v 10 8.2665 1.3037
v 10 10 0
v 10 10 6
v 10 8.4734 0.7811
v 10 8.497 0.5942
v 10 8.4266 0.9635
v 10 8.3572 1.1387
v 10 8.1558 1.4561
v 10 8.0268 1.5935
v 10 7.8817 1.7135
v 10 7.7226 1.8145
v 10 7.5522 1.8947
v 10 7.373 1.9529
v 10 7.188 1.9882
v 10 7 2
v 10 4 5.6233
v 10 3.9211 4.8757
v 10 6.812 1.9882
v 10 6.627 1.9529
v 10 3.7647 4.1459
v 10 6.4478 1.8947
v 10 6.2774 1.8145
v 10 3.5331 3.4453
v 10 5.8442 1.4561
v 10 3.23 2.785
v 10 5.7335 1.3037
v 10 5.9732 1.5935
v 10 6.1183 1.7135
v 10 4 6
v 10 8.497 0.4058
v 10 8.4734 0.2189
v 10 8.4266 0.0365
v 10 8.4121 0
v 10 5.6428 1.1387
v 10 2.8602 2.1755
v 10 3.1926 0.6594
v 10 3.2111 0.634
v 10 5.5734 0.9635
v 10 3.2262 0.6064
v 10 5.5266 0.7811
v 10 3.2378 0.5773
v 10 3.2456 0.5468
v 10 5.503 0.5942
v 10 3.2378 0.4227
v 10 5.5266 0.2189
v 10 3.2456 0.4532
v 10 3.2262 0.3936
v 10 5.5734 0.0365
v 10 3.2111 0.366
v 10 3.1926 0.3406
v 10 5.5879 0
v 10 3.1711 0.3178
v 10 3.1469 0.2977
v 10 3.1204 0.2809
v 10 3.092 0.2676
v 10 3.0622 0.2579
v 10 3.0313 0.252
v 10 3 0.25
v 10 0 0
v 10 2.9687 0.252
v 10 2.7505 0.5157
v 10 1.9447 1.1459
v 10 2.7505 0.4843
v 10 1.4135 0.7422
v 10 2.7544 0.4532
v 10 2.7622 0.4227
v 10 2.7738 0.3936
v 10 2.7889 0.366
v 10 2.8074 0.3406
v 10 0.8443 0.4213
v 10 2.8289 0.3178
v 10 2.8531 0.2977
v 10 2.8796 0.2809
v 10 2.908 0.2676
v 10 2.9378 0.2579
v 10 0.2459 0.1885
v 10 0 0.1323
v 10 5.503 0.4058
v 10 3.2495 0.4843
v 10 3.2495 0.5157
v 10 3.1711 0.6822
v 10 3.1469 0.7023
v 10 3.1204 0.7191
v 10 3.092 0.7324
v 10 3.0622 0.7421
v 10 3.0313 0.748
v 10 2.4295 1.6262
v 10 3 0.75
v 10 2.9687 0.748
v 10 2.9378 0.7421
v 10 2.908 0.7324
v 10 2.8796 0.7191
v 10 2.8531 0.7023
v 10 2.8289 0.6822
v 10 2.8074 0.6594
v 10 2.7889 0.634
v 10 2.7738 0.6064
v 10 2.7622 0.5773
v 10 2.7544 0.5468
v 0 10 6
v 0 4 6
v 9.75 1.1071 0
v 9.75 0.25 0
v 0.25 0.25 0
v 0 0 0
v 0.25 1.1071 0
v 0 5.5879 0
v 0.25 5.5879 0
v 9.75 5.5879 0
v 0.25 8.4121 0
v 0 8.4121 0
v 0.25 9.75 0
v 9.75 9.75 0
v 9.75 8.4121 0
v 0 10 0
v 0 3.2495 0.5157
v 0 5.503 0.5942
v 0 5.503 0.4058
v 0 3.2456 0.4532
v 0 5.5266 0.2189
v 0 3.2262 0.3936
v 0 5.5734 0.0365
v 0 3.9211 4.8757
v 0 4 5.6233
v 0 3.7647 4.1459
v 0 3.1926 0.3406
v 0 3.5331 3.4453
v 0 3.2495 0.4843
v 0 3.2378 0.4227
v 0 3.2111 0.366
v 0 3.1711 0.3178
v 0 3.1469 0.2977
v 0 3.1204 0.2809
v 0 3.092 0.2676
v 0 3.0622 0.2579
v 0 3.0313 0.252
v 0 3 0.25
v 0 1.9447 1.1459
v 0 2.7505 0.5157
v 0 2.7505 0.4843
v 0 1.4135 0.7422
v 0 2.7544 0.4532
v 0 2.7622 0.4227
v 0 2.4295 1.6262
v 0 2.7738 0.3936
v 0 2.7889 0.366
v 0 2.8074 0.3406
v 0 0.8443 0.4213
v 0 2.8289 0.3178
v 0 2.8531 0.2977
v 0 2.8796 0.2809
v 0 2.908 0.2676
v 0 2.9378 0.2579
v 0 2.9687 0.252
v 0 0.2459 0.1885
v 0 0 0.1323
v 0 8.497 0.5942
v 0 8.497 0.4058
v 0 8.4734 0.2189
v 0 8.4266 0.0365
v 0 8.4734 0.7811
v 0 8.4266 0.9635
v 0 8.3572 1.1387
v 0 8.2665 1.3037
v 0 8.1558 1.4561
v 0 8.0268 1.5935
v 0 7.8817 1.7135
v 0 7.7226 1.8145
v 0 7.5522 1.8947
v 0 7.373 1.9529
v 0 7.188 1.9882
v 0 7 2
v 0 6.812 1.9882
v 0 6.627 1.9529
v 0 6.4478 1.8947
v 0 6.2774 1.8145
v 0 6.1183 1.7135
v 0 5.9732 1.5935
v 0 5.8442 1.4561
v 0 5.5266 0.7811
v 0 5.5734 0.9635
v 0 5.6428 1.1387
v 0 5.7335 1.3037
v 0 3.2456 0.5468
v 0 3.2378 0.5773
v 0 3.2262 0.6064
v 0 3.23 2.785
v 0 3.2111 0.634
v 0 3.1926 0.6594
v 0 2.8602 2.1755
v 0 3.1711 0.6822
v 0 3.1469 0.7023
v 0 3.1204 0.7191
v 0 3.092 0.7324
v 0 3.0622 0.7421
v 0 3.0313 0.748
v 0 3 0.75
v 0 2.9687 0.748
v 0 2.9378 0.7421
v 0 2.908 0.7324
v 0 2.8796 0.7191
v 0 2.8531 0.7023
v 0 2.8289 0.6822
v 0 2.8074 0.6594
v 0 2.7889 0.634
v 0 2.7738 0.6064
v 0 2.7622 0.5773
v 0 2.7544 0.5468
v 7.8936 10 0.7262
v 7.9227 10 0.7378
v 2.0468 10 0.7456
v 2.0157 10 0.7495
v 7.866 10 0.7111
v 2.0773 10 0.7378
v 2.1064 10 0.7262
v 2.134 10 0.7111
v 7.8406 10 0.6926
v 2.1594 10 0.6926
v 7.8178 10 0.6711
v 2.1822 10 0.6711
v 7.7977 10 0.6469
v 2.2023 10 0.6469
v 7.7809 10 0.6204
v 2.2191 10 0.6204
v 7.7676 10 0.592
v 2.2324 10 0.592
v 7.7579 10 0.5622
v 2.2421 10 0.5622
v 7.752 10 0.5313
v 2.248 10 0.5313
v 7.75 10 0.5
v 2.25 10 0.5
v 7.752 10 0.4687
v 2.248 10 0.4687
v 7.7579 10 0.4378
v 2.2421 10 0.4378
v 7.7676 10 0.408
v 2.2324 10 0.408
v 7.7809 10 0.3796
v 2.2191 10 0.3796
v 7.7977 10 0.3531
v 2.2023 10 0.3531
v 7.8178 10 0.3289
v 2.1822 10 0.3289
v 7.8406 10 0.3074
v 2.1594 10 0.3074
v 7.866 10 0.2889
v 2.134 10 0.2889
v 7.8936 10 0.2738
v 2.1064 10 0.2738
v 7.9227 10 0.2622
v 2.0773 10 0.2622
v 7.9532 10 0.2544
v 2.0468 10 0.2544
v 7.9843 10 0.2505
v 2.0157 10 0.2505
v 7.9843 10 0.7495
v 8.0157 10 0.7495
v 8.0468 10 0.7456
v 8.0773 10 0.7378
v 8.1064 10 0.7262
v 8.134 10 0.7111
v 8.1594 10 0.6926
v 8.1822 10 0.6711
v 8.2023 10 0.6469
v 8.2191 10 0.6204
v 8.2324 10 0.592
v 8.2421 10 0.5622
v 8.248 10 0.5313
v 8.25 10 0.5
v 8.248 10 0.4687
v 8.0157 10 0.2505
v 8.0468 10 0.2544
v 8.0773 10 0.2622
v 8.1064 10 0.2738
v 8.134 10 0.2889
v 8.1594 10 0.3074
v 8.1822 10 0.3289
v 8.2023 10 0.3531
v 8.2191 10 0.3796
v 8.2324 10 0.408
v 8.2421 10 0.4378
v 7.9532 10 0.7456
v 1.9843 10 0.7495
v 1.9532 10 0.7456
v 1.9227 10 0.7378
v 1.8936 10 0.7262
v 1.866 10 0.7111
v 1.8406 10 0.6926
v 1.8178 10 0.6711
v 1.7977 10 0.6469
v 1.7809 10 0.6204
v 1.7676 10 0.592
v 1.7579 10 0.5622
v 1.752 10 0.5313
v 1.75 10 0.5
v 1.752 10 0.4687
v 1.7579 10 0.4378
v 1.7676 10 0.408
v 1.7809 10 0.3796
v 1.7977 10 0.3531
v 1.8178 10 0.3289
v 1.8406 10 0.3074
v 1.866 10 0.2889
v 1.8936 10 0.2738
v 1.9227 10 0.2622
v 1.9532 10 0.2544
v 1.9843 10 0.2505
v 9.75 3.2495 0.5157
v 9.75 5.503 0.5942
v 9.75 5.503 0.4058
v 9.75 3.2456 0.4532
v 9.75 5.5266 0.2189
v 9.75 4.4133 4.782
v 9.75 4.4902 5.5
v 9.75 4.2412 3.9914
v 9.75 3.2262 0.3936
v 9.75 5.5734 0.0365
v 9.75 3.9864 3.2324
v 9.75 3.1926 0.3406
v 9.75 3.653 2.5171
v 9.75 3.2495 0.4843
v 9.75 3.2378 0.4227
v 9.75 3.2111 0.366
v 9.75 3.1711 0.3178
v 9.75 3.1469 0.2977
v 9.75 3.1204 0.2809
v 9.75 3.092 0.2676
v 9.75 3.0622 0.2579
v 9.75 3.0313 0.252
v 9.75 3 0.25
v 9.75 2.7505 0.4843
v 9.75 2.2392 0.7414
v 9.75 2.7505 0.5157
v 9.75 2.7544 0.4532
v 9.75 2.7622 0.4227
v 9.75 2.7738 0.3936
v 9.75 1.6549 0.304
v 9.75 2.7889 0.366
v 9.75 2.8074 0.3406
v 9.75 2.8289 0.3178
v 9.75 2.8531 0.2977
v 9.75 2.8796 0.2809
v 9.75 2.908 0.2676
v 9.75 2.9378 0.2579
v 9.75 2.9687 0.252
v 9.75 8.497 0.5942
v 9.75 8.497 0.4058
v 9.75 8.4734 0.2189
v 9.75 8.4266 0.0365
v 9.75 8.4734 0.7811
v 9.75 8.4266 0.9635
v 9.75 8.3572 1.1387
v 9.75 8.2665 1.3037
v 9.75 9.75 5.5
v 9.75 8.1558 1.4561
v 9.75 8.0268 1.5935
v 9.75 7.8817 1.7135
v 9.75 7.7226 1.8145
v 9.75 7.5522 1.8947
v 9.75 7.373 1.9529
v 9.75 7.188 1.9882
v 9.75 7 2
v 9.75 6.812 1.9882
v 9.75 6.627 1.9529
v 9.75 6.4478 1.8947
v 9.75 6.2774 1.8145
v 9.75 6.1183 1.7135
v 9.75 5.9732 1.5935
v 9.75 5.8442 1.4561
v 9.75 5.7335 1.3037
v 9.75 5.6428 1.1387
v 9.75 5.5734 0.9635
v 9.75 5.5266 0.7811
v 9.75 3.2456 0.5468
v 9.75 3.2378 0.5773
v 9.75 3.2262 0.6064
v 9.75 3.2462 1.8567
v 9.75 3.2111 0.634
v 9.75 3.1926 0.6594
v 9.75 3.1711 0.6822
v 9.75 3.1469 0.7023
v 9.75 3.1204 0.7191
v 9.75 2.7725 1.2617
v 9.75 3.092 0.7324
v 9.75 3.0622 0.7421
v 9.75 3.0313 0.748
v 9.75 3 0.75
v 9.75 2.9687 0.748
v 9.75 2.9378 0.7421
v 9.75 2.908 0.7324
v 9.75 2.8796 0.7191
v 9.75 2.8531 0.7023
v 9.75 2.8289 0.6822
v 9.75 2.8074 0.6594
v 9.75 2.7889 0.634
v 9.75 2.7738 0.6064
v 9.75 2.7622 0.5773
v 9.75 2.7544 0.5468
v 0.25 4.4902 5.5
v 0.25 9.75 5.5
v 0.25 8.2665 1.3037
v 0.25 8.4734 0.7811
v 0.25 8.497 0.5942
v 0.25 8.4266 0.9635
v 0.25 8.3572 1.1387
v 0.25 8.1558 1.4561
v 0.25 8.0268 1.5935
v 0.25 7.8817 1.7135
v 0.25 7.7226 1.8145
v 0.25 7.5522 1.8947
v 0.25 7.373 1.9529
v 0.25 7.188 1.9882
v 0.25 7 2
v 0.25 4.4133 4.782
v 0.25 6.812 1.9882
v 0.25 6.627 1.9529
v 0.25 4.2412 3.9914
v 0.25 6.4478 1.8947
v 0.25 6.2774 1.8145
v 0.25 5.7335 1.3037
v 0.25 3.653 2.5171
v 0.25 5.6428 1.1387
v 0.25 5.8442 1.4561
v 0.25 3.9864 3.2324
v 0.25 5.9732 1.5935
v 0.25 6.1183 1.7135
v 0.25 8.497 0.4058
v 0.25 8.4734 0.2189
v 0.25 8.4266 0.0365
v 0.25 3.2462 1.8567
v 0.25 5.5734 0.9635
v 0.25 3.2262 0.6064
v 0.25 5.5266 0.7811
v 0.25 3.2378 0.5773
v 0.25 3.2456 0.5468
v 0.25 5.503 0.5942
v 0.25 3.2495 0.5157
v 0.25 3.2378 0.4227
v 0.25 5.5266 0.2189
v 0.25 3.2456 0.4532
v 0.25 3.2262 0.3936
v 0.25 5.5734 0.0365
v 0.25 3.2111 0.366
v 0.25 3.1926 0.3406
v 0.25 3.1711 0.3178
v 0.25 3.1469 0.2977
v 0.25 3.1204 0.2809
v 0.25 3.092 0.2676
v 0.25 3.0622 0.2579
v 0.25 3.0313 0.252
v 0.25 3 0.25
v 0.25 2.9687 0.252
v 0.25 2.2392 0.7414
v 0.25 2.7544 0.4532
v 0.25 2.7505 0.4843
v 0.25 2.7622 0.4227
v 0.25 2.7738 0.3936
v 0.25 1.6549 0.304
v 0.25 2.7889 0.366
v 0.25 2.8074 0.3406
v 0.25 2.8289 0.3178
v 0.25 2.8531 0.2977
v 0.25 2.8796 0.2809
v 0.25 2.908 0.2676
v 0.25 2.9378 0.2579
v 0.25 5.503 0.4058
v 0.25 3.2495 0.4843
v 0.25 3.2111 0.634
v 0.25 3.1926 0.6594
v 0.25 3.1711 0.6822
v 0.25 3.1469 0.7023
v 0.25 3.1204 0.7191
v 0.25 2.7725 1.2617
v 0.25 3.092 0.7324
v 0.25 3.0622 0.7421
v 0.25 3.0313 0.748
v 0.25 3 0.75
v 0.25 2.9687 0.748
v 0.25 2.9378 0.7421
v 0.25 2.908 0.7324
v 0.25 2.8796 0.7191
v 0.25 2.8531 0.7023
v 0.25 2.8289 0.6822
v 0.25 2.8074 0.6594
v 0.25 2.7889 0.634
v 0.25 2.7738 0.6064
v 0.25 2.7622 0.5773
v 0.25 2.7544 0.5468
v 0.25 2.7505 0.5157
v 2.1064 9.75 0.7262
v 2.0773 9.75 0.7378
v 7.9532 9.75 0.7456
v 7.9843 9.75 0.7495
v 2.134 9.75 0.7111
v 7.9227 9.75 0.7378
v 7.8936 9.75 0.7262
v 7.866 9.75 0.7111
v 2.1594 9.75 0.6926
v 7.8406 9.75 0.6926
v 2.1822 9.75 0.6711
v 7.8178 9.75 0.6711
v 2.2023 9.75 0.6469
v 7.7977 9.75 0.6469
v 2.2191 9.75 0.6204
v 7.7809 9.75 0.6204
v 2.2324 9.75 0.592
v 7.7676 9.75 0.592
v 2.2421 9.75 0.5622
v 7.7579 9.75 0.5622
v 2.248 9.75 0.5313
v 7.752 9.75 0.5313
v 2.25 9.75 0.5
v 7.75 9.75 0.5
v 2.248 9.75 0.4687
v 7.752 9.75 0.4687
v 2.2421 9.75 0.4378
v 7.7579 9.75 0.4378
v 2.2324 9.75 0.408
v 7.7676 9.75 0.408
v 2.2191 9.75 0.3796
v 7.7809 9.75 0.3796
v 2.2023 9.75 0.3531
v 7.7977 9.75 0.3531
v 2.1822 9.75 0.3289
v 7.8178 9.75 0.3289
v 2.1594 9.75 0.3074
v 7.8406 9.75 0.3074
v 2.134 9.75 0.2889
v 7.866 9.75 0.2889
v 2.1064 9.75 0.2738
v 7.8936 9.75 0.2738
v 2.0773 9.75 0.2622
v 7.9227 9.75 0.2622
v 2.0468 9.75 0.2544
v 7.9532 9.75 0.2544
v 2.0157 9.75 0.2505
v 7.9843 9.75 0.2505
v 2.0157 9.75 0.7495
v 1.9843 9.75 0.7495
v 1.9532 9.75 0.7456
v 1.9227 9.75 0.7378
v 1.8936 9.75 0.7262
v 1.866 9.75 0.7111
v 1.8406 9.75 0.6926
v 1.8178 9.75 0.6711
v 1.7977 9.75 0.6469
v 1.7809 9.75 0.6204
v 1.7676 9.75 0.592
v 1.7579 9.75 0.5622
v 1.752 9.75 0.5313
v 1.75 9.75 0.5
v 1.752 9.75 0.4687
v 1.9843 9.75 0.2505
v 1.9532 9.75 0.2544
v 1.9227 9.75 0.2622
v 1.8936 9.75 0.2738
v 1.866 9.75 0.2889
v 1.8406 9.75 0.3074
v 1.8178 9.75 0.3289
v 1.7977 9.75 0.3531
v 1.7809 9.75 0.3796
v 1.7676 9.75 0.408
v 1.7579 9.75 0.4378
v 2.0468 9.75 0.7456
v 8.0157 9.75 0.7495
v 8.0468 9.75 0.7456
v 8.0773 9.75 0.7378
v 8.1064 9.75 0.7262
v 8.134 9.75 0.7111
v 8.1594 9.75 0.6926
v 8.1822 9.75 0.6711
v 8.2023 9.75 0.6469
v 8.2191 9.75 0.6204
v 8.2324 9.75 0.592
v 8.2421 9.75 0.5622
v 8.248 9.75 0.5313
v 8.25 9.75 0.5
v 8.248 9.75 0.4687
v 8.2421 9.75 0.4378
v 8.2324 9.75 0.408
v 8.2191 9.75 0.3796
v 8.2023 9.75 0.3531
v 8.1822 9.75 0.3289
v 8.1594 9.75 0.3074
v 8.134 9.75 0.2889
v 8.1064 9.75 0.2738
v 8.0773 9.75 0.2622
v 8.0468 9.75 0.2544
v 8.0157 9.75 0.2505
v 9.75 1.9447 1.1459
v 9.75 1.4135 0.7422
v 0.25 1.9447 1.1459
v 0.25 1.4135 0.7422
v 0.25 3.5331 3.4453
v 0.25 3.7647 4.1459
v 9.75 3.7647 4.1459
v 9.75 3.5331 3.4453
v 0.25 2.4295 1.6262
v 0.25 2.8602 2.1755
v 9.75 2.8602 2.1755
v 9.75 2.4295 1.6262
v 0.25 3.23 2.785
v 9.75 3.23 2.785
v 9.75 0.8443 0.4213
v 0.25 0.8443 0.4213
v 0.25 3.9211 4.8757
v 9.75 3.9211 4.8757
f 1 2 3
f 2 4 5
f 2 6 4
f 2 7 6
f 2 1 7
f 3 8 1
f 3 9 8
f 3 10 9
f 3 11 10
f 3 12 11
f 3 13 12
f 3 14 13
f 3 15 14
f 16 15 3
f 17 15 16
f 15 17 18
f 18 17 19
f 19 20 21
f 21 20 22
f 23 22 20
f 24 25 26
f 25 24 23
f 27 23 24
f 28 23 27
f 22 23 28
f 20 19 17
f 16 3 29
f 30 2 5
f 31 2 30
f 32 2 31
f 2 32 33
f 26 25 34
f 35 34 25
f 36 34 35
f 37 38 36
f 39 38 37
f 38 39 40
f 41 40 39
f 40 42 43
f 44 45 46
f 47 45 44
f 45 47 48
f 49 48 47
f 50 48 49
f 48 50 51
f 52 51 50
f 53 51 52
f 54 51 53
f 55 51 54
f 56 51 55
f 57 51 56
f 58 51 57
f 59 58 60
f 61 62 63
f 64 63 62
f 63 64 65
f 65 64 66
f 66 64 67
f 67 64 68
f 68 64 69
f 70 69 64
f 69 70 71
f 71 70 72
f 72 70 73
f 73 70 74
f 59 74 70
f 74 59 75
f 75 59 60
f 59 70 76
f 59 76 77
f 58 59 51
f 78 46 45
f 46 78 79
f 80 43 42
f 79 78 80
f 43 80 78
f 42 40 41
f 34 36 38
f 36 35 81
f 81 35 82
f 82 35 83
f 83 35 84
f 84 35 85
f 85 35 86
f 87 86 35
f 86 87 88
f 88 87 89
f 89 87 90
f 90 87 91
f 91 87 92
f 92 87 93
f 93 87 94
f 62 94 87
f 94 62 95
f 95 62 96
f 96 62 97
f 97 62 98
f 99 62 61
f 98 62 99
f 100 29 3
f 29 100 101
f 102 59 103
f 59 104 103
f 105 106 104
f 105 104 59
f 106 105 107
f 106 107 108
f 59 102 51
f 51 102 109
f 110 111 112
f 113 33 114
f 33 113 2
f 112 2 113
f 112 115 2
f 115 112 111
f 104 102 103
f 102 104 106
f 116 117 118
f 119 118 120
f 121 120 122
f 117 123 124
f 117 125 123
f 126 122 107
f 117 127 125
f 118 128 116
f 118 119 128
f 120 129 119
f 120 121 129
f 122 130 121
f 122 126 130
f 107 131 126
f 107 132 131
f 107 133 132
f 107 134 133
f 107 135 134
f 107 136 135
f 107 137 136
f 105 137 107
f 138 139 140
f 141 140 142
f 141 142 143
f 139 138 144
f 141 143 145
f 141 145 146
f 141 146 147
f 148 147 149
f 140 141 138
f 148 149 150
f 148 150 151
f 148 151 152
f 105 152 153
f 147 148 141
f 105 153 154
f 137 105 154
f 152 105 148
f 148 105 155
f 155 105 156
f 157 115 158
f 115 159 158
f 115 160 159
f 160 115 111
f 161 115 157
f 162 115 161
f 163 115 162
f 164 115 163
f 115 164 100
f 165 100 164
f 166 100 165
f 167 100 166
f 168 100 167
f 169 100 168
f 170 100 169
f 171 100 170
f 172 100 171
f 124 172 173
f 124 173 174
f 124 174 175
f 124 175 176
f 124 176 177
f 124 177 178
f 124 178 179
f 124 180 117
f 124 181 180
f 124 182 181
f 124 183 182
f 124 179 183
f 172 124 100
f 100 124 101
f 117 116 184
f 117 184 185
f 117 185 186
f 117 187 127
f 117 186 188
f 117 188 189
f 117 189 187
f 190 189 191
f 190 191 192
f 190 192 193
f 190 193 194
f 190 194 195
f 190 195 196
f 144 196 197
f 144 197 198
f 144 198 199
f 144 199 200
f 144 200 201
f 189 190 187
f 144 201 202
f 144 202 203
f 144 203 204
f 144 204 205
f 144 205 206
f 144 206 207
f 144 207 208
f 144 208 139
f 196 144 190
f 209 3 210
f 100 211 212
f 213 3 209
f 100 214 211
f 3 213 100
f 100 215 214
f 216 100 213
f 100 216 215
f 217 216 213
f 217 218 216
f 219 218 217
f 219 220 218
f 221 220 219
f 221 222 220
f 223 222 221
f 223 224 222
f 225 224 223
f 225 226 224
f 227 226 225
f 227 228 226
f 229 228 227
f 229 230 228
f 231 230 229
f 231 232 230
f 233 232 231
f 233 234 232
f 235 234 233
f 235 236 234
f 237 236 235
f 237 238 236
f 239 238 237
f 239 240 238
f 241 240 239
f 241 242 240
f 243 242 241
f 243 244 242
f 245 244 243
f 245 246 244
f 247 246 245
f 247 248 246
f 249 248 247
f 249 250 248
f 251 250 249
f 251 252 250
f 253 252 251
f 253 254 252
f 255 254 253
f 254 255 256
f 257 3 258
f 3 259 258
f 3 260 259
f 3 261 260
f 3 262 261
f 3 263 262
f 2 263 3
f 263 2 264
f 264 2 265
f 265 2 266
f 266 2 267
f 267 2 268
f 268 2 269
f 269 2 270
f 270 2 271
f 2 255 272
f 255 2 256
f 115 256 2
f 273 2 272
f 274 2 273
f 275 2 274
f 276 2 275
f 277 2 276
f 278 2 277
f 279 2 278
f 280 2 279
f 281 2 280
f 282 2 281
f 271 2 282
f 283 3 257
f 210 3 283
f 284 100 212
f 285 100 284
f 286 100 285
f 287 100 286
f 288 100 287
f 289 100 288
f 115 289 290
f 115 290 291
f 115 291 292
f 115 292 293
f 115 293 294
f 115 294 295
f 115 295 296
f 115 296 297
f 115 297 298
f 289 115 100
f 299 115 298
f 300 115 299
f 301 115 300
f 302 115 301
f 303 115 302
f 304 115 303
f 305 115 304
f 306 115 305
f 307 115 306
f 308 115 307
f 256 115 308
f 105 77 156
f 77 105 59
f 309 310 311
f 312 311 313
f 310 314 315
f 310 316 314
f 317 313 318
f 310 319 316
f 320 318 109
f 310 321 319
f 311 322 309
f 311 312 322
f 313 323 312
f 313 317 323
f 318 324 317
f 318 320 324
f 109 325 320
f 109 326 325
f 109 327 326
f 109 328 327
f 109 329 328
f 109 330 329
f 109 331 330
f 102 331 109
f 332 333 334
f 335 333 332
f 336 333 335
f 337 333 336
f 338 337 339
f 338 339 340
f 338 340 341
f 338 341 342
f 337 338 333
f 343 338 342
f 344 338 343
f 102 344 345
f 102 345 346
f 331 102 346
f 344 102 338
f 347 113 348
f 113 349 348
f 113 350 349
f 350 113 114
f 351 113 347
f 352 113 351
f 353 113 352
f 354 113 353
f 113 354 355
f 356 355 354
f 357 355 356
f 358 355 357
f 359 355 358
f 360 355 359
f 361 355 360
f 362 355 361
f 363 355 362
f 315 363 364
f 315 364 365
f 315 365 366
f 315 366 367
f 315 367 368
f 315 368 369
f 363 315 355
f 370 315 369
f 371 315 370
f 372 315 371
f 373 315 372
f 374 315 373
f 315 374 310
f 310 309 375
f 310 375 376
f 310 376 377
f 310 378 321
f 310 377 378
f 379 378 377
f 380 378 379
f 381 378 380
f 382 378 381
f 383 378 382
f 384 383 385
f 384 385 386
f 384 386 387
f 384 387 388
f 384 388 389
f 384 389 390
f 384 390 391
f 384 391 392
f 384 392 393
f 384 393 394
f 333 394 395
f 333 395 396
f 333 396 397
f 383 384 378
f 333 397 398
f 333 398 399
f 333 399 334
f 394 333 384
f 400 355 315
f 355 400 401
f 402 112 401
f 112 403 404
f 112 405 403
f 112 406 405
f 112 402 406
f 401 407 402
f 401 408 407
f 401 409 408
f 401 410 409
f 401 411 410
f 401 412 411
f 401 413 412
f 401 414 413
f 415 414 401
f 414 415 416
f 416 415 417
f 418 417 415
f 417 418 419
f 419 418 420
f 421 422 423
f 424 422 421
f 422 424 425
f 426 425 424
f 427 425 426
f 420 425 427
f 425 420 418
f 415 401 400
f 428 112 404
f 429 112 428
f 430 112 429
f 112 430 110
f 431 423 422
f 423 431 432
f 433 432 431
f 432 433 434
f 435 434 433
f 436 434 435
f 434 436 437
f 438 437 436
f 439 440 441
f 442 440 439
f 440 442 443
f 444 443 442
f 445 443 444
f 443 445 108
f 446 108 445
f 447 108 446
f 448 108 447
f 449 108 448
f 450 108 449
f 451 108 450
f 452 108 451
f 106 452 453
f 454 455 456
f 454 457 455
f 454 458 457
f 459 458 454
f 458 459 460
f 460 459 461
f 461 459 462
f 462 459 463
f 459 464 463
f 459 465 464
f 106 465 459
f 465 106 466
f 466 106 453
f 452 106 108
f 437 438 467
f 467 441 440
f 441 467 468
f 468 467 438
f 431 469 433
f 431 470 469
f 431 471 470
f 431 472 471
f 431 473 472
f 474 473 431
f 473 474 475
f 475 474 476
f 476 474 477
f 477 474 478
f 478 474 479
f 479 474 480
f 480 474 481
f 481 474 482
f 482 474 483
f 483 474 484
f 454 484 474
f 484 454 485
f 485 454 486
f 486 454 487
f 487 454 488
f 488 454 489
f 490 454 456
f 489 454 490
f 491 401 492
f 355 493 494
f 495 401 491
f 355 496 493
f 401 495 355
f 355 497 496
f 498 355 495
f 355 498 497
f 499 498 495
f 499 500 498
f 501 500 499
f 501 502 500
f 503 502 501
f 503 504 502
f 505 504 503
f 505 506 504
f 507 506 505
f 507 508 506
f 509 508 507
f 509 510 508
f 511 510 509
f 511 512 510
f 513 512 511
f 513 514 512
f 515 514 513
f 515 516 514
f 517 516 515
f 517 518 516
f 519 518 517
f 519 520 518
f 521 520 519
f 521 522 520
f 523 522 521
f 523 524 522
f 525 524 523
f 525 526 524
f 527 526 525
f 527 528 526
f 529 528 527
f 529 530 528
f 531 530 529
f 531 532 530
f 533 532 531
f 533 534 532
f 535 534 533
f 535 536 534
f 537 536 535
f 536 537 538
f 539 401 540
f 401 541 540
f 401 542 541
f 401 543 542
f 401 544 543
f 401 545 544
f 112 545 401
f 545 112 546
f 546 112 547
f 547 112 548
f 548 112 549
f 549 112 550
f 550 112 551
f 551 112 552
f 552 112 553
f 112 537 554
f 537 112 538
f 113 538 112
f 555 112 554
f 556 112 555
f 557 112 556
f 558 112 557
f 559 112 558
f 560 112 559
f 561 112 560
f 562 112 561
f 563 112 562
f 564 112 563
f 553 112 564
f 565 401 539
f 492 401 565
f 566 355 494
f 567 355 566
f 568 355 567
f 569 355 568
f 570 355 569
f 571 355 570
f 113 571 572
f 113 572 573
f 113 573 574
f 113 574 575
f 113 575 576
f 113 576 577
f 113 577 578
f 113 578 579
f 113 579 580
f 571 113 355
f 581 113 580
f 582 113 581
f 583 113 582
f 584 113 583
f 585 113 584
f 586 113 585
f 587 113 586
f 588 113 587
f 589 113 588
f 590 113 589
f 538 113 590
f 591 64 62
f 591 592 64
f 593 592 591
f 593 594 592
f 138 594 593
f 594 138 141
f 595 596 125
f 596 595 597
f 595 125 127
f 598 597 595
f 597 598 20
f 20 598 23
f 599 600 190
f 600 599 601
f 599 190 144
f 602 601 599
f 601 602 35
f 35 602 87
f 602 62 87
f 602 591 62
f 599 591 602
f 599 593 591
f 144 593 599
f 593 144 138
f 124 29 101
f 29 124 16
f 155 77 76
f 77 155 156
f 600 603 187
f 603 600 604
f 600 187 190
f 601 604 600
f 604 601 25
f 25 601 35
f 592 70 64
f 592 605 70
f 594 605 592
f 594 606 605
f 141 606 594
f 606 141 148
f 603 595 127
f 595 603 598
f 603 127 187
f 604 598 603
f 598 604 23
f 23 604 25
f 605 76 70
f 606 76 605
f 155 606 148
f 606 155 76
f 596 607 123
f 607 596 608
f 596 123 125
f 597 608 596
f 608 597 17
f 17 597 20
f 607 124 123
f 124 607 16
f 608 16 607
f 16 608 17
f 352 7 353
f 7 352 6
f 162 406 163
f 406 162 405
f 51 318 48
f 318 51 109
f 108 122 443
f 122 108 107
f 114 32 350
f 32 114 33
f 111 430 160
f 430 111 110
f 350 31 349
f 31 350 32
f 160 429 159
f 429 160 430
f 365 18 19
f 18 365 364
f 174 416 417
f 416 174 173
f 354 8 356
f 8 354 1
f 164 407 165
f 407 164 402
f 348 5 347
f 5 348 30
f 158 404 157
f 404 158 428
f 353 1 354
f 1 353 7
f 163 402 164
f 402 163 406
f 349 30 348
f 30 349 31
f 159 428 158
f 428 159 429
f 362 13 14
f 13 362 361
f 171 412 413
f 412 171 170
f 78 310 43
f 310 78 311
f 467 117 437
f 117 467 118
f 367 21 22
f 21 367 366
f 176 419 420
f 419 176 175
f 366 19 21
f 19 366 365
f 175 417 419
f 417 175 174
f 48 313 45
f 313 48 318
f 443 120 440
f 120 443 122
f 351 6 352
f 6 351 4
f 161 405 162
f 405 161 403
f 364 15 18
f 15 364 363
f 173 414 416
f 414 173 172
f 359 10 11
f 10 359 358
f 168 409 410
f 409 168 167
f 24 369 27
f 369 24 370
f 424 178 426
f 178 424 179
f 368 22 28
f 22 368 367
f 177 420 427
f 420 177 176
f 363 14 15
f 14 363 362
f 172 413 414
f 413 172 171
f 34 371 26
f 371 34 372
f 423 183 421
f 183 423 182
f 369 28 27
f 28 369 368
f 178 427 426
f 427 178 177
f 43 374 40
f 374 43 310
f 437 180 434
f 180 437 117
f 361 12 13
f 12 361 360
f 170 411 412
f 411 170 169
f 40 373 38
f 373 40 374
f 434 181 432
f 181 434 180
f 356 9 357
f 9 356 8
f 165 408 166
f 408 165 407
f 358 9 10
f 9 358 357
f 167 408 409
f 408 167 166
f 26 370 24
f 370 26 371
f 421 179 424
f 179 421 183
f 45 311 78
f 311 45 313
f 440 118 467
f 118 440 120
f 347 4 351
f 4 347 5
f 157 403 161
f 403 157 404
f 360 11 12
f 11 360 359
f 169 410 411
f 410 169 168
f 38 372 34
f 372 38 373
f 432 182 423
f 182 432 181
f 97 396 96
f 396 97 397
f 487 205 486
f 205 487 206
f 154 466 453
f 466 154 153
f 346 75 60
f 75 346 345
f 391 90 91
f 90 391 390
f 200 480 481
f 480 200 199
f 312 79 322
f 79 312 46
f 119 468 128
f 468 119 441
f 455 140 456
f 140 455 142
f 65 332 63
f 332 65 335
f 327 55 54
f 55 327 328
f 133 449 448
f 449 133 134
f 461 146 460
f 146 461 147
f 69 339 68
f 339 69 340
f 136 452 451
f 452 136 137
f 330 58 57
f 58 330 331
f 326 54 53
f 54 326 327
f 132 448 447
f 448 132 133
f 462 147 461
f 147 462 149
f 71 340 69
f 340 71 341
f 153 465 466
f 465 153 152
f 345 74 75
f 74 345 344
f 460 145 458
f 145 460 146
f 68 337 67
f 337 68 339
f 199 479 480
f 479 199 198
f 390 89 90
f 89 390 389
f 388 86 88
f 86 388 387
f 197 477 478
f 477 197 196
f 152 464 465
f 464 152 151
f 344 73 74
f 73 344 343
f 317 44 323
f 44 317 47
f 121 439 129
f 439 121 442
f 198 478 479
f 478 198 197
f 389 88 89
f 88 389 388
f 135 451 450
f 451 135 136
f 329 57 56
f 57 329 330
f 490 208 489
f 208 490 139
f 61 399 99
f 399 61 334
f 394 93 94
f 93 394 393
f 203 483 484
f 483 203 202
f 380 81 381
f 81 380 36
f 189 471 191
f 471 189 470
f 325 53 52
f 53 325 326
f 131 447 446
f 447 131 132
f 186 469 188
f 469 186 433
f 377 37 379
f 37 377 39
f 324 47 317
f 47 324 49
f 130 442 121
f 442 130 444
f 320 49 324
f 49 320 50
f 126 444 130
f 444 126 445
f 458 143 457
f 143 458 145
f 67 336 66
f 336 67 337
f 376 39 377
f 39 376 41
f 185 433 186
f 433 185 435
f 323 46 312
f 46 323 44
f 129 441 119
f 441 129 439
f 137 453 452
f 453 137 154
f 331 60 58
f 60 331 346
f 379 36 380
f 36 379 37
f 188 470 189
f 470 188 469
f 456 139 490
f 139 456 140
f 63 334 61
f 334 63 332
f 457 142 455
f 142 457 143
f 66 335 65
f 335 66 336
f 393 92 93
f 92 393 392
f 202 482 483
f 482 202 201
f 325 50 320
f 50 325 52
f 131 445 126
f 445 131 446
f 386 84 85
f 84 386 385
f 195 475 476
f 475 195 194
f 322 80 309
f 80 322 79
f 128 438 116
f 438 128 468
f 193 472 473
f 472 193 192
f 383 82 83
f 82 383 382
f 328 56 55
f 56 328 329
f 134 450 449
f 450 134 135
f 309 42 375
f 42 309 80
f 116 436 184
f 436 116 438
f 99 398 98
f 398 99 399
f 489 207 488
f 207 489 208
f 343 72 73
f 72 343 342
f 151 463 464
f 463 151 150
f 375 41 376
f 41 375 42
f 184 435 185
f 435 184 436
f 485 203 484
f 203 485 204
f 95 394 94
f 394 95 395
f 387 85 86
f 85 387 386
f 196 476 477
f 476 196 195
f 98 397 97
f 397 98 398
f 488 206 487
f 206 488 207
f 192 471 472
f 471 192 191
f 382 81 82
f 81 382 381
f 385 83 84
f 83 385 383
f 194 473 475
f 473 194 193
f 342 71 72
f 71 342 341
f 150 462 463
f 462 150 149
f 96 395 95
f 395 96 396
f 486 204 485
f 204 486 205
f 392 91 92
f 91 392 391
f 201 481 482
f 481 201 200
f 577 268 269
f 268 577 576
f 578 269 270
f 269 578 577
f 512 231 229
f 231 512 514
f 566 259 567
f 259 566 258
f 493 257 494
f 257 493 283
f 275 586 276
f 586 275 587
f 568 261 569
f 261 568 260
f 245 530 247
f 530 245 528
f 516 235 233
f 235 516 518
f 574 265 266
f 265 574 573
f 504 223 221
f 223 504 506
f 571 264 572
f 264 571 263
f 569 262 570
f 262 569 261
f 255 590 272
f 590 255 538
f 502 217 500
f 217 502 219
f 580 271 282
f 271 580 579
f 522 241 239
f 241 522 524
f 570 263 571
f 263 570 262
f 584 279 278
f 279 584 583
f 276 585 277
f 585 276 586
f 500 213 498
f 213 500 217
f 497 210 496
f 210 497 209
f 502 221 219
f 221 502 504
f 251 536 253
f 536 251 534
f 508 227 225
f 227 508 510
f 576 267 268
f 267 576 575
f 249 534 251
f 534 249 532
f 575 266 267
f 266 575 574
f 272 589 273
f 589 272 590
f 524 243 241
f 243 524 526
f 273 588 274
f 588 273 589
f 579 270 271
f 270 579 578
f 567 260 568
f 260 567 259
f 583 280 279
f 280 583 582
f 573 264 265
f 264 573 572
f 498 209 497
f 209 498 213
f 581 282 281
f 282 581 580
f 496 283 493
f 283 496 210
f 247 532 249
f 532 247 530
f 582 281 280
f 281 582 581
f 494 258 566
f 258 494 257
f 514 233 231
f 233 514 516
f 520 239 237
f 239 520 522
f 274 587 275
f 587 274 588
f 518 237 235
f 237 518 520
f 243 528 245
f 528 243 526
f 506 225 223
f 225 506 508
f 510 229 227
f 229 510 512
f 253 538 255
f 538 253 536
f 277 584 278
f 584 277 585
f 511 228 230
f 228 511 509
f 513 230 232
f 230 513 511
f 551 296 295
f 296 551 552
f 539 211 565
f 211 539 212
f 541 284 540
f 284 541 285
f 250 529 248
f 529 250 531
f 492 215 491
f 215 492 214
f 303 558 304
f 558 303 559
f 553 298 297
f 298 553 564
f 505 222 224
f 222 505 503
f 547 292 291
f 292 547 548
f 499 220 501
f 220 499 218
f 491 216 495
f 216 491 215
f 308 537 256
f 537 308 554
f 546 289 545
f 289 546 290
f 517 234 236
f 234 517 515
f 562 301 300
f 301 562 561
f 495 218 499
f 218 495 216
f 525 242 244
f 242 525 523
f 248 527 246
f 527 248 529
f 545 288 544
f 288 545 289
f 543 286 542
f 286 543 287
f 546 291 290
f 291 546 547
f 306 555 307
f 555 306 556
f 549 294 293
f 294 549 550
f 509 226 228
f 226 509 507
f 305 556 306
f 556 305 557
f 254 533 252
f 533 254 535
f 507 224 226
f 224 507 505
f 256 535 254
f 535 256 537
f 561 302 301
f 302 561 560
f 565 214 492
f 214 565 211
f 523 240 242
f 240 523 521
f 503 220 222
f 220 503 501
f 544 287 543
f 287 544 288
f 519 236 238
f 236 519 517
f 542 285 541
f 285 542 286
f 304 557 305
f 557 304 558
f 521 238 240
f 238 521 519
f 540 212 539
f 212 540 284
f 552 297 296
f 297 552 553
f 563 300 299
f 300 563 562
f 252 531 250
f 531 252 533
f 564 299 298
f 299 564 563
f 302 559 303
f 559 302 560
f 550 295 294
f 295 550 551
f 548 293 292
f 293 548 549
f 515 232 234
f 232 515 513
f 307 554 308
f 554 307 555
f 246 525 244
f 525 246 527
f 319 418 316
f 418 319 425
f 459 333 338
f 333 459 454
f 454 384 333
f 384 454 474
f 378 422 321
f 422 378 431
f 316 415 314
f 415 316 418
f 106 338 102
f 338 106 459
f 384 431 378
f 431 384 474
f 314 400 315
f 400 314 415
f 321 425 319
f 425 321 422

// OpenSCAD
$fn=50;

w=10;
h=10;
d=6;
r=1.5;
wall = 0.25;
difference(){
    cube([w, h, d]);
    translate([wall, wall, -wall]){
        cube([w-wall*2,h-wall*2,d-wall]);
    }
    translate([0,-1,6]){
        rotate([0,90,0]){
            resize([12,10,h])cylinder(5);
        }
    }
    translate([0,7,0.5]){
        rotate([0,90,0]){
           cylinder(w*2, r,r , center = true);
            
        }
    }
    translate([0,3,0.5]){
        rotate([0,90,0]){
            cylinder(w, 0.25, 0.25, centre = true);
        }
    }
    translate([8,10,0.5]){
        rotate([90,0,0]){
            cylinder(2, 0.25, 0.25, centre = true);
        }
    }
    translate([2,10,0.5]){
        rotate([90,0,0]){
            cylinder(2, 0.25, 0.25, centre = true);
        }
    }
}
difference(){
    translate([0,-1,6]){
        rotate([0,90,0]){
           resize([13,11,h])cylinder(5); 
        }
    }
     translate([0,-1,6]){
         rotate([0,90,0]){ 
           resize([12,10,h])cylinder(5); 
        }
    }
    translate([0, -10, -1]){
      cube([w,h,d+10]);  
    }
    translate([0,-1,d]){
        cube([w, h+5, 2*d]);
    }
    translate([0,0,-1]){
        cube([w,h, 1]);
    }
}
